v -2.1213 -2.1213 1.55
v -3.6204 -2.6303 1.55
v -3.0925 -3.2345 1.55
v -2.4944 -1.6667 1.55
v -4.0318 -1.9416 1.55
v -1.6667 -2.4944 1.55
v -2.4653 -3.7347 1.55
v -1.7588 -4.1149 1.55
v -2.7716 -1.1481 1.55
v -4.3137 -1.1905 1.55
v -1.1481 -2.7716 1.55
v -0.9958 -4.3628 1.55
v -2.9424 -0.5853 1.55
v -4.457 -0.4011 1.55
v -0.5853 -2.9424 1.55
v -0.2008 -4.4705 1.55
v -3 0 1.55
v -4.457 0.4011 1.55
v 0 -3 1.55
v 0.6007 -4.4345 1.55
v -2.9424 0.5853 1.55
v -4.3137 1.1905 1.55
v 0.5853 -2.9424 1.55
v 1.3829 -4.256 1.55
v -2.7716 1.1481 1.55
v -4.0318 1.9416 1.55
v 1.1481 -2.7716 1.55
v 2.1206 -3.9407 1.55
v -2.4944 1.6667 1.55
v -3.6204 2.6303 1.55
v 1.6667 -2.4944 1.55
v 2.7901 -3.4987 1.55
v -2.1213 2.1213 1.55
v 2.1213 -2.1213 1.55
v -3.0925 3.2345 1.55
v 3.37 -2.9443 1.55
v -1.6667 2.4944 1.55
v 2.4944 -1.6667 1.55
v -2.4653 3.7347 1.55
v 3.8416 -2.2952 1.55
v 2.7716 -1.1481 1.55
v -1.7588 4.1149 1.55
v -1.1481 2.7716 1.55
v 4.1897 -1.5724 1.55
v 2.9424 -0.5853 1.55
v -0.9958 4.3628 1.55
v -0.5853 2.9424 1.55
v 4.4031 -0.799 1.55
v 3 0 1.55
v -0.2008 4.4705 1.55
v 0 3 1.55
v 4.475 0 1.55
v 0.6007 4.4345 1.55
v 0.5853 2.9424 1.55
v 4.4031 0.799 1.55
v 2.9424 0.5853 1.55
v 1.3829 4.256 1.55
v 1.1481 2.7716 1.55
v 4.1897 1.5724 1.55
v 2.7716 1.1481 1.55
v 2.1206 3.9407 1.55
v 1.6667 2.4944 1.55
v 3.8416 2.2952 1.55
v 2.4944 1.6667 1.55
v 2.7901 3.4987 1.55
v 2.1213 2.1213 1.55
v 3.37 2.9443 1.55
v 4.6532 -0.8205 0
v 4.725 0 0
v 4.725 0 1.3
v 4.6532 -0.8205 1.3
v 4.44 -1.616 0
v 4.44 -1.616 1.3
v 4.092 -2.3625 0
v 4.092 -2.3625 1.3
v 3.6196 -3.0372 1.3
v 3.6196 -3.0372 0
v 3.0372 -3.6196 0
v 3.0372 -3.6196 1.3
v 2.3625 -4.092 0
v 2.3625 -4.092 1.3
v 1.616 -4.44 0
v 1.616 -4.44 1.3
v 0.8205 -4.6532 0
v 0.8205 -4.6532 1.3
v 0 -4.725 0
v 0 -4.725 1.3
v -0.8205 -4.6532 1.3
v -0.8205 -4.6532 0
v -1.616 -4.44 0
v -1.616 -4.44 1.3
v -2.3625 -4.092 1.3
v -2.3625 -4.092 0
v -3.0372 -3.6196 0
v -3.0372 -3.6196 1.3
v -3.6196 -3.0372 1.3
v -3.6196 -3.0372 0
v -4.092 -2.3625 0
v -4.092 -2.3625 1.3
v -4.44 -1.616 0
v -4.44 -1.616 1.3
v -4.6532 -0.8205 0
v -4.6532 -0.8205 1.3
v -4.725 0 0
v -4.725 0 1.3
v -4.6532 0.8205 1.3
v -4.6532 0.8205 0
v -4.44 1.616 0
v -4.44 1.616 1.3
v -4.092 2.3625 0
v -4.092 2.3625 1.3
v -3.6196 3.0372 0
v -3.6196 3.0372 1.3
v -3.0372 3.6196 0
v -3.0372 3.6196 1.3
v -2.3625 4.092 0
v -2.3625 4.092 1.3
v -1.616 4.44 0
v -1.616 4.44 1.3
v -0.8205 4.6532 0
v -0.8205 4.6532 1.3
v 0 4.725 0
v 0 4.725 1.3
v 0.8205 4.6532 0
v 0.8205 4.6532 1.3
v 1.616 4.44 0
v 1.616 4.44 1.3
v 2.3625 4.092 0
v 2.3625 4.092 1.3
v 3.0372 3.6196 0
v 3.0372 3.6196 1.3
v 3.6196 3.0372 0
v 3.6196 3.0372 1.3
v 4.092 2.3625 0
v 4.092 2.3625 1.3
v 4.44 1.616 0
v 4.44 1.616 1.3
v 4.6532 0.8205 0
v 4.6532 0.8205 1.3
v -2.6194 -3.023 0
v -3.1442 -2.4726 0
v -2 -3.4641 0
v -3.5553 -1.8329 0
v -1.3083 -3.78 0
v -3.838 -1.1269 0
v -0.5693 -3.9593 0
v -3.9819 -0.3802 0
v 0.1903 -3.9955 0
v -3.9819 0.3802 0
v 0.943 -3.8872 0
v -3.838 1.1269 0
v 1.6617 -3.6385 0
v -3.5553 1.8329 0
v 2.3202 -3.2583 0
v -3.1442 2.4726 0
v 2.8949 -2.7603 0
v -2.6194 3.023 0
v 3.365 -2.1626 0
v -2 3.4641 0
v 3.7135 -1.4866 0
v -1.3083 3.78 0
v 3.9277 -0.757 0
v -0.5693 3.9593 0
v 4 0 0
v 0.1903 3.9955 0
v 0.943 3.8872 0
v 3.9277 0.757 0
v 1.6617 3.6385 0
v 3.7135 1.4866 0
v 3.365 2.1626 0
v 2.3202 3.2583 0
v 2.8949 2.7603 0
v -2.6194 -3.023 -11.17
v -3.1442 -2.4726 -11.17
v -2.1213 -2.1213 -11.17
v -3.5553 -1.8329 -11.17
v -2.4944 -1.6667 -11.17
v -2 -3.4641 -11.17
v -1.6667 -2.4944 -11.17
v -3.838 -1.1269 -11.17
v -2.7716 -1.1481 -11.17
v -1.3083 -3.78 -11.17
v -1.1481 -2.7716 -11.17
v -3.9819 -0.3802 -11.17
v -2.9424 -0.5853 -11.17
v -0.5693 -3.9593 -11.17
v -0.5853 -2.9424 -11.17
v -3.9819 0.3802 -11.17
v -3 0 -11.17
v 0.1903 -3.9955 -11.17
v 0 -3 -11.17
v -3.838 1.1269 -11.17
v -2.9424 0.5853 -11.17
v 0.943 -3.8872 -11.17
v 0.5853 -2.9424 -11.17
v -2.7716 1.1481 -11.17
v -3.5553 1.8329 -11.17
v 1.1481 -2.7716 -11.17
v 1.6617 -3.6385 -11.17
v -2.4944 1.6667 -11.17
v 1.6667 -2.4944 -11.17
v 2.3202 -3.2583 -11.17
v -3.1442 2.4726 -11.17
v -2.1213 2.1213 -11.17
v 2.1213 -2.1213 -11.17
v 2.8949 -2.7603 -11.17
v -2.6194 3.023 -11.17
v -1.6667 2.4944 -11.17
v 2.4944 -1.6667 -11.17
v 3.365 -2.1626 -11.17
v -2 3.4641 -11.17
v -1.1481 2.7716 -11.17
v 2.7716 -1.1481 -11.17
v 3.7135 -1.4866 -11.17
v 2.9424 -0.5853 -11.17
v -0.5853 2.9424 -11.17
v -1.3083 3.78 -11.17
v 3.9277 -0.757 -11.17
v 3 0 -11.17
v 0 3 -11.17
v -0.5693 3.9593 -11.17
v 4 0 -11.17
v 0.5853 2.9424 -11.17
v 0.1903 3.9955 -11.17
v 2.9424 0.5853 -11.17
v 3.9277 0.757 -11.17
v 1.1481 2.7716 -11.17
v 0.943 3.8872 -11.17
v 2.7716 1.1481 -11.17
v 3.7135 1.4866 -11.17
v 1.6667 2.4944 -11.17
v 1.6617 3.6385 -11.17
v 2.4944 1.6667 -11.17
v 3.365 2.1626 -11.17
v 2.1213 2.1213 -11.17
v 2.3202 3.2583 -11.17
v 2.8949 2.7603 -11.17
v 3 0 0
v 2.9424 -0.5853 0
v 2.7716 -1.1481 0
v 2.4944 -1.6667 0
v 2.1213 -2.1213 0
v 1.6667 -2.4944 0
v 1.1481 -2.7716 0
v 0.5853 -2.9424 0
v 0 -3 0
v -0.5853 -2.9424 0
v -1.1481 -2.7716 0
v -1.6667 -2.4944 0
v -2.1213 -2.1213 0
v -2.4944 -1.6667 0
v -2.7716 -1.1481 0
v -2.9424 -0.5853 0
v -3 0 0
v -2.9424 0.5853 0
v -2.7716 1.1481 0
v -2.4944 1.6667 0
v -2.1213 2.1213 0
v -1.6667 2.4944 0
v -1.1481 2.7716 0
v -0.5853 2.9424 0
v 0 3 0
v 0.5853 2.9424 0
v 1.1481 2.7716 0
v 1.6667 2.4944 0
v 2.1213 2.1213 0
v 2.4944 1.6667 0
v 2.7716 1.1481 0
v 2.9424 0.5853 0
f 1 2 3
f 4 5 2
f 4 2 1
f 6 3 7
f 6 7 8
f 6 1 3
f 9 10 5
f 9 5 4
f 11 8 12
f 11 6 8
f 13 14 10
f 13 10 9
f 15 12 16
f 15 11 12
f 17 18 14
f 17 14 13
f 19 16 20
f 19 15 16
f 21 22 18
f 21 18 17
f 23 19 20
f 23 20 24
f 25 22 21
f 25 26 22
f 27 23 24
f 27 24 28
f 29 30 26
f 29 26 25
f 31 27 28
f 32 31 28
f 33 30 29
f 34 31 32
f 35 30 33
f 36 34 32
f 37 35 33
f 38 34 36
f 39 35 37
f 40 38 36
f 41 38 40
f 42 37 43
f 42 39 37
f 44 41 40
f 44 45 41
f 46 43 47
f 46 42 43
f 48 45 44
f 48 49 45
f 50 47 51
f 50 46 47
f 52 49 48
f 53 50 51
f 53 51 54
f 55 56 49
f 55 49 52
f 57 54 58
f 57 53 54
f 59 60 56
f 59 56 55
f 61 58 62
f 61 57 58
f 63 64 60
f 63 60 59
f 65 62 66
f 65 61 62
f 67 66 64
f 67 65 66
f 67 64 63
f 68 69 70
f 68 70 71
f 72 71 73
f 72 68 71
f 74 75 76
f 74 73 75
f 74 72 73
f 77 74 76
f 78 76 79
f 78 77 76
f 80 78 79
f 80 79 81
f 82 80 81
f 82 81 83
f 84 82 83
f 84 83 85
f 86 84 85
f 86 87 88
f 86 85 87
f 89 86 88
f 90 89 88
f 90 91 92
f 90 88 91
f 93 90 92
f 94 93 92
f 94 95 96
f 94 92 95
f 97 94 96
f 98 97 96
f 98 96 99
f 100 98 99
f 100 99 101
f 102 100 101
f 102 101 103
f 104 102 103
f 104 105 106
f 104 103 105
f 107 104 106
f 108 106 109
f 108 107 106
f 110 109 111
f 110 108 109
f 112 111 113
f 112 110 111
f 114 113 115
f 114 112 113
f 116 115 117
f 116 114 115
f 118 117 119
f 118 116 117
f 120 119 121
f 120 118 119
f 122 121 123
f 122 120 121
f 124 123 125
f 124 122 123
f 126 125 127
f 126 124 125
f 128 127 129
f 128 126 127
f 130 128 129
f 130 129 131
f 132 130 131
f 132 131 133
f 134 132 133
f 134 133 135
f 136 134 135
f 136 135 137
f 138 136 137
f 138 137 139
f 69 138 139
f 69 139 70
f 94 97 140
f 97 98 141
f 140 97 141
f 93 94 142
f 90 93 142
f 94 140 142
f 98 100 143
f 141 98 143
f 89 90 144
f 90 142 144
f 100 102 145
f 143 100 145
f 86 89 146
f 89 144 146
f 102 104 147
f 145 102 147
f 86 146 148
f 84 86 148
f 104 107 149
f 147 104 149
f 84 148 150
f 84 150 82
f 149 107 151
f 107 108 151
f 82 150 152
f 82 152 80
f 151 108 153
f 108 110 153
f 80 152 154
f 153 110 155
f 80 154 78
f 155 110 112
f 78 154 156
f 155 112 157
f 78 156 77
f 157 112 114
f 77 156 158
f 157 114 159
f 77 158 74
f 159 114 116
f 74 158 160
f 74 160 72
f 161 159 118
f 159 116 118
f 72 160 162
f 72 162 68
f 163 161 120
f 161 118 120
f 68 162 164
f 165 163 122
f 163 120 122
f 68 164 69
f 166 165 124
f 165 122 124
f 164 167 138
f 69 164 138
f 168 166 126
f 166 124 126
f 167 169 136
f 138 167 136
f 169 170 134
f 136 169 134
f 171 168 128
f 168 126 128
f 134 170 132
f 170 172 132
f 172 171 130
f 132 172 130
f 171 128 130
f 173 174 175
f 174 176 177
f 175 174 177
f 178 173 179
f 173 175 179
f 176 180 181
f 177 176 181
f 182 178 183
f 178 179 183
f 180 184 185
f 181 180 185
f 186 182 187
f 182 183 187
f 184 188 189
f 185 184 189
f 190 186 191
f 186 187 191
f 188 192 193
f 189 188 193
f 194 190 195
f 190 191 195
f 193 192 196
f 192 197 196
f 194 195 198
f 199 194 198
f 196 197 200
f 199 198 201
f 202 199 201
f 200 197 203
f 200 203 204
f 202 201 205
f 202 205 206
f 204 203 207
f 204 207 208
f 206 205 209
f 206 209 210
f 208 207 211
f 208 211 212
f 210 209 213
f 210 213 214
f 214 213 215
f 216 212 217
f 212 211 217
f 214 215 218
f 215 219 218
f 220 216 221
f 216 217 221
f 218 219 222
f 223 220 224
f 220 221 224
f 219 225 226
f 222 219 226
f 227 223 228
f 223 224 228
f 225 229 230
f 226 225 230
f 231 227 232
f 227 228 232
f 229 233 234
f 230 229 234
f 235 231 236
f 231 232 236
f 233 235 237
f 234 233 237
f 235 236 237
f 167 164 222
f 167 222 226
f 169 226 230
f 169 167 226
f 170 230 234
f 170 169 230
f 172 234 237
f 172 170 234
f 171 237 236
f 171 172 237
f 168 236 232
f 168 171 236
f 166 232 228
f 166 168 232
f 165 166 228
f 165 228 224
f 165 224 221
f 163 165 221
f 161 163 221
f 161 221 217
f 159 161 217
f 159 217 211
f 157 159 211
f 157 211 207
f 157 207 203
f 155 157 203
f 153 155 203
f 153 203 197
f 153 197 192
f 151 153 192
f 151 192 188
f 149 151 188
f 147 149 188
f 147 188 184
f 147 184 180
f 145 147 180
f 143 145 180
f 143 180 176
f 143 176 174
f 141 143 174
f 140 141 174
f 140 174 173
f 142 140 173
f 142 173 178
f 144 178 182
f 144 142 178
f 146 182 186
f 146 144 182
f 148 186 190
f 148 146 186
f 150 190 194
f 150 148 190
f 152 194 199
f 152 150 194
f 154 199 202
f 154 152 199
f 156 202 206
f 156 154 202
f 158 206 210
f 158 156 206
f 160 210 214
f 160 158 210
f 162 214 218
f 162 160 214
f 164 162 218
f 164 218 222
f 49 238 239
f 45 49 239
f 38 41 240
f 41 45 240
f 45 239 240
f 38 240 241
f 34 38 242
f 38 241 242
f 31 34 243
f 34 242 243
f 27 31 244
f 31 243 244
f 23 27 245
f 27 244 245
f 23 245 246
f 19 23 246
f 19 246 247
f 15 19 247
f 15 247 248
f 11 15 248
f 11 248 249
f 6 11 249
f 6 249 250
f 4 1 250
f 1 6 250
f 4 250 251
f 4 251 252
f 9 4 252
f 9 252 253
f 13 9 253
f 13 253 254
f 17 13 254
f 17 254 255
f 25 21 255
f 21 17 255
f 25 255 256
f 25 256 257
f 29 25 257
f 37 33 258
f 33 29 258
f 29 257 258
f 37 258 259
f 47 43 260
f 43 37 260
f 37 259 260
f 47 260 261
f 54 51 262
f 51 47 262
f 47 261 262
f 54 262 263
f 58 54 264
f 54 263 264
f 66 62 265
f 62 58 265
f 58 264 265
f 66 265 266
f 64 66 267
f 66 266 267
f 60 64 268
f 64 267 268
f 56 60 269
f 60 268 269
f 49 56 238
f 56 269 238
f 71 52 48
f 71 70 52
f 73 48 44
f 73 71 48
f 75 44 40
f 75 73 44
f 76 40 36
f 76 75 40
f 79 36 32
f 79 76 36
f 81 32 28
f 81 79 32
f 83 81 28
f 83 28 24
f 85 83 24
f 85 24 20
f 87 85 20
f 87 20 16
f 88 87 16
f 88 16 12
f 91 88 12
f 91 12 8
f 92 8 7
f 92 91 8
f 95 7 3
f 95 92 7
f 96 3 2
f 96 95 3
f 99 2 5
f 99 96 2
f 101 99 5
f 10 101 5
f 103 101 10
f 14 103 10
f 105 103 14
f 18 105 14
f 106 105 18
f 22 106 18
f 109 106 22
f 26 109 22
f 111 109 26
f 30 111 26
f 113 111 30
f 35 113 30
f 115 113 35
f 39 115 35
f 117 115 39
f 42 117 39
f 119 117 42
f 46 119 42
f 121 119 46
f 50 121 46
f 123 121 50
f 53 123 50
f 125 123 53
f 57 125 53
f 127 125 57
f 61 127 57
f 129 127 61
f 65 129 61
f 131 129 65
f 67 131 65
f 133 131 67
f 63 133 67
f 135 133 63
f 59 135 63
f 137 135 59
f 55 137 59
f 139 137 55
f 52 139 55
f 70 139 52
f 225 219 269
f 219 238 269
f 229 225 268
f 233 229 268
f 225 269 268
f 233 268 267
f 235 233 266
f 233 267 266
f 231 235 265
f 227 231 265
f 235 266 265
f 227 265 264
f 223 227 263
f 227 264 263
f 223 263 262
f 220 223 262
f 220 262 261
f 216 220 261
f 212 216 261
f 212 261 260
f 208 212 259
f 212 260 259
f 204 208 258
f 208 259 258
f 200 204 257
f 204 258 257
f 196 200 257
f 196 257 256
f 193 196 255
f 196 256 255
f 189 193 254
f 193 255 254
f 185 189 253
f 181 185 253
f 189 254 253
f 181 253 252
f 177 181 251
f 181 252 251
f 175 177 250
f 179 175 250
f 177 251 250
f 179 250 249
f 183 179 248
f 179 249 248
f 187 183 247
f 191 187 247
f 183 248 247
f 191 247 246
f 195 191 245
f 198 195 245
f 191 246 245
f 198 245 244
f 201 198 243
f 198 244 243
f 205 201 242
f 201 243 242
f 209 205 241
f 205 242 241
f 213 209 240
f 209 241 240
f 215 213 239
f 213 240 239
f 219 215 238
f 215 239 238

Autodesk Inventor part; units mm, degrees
ref_plane "YZ Plane" through (0, 0, 0) normal (1, 0, 0) x (0, 1, 0)
ref_plane "XZ Plane" through (0, 0, 0) normal (0, 1, 0) x (-1, 0, 0)
ref_plane "XY Plane" through (0, 0, 0) normal (0, 0, 1) x (1, 0, 0)
sketch "Sketch1" plane through (0, 0, 0) normal (0, 0, 1) x (1, 0, 0)
  circle A0 centre (0, 0) radius 4.725
  circle A1 centre (0, 0) radius 3
  circle A2 centre (0, 0) radius 4
  dimension "d0" = 9.45
  dimension "d1" = 6
  dimension "d4" = 8
extrude "Extrusion1" add sketch "Sketch1" along normal blind 1.55 contours A0 | A2
extrude "Extrusion2" add sketch "Sketch1" against normal blind 11.17 contours A2
chamfer "Chamfer1" distance 0.25 angle 45 1 edges at (-4.725, 0, 1.55)
properties part number "Tetrix Bronze Bushing (modified to fit vex couplers)" material "Bronze, Soft Tin"
